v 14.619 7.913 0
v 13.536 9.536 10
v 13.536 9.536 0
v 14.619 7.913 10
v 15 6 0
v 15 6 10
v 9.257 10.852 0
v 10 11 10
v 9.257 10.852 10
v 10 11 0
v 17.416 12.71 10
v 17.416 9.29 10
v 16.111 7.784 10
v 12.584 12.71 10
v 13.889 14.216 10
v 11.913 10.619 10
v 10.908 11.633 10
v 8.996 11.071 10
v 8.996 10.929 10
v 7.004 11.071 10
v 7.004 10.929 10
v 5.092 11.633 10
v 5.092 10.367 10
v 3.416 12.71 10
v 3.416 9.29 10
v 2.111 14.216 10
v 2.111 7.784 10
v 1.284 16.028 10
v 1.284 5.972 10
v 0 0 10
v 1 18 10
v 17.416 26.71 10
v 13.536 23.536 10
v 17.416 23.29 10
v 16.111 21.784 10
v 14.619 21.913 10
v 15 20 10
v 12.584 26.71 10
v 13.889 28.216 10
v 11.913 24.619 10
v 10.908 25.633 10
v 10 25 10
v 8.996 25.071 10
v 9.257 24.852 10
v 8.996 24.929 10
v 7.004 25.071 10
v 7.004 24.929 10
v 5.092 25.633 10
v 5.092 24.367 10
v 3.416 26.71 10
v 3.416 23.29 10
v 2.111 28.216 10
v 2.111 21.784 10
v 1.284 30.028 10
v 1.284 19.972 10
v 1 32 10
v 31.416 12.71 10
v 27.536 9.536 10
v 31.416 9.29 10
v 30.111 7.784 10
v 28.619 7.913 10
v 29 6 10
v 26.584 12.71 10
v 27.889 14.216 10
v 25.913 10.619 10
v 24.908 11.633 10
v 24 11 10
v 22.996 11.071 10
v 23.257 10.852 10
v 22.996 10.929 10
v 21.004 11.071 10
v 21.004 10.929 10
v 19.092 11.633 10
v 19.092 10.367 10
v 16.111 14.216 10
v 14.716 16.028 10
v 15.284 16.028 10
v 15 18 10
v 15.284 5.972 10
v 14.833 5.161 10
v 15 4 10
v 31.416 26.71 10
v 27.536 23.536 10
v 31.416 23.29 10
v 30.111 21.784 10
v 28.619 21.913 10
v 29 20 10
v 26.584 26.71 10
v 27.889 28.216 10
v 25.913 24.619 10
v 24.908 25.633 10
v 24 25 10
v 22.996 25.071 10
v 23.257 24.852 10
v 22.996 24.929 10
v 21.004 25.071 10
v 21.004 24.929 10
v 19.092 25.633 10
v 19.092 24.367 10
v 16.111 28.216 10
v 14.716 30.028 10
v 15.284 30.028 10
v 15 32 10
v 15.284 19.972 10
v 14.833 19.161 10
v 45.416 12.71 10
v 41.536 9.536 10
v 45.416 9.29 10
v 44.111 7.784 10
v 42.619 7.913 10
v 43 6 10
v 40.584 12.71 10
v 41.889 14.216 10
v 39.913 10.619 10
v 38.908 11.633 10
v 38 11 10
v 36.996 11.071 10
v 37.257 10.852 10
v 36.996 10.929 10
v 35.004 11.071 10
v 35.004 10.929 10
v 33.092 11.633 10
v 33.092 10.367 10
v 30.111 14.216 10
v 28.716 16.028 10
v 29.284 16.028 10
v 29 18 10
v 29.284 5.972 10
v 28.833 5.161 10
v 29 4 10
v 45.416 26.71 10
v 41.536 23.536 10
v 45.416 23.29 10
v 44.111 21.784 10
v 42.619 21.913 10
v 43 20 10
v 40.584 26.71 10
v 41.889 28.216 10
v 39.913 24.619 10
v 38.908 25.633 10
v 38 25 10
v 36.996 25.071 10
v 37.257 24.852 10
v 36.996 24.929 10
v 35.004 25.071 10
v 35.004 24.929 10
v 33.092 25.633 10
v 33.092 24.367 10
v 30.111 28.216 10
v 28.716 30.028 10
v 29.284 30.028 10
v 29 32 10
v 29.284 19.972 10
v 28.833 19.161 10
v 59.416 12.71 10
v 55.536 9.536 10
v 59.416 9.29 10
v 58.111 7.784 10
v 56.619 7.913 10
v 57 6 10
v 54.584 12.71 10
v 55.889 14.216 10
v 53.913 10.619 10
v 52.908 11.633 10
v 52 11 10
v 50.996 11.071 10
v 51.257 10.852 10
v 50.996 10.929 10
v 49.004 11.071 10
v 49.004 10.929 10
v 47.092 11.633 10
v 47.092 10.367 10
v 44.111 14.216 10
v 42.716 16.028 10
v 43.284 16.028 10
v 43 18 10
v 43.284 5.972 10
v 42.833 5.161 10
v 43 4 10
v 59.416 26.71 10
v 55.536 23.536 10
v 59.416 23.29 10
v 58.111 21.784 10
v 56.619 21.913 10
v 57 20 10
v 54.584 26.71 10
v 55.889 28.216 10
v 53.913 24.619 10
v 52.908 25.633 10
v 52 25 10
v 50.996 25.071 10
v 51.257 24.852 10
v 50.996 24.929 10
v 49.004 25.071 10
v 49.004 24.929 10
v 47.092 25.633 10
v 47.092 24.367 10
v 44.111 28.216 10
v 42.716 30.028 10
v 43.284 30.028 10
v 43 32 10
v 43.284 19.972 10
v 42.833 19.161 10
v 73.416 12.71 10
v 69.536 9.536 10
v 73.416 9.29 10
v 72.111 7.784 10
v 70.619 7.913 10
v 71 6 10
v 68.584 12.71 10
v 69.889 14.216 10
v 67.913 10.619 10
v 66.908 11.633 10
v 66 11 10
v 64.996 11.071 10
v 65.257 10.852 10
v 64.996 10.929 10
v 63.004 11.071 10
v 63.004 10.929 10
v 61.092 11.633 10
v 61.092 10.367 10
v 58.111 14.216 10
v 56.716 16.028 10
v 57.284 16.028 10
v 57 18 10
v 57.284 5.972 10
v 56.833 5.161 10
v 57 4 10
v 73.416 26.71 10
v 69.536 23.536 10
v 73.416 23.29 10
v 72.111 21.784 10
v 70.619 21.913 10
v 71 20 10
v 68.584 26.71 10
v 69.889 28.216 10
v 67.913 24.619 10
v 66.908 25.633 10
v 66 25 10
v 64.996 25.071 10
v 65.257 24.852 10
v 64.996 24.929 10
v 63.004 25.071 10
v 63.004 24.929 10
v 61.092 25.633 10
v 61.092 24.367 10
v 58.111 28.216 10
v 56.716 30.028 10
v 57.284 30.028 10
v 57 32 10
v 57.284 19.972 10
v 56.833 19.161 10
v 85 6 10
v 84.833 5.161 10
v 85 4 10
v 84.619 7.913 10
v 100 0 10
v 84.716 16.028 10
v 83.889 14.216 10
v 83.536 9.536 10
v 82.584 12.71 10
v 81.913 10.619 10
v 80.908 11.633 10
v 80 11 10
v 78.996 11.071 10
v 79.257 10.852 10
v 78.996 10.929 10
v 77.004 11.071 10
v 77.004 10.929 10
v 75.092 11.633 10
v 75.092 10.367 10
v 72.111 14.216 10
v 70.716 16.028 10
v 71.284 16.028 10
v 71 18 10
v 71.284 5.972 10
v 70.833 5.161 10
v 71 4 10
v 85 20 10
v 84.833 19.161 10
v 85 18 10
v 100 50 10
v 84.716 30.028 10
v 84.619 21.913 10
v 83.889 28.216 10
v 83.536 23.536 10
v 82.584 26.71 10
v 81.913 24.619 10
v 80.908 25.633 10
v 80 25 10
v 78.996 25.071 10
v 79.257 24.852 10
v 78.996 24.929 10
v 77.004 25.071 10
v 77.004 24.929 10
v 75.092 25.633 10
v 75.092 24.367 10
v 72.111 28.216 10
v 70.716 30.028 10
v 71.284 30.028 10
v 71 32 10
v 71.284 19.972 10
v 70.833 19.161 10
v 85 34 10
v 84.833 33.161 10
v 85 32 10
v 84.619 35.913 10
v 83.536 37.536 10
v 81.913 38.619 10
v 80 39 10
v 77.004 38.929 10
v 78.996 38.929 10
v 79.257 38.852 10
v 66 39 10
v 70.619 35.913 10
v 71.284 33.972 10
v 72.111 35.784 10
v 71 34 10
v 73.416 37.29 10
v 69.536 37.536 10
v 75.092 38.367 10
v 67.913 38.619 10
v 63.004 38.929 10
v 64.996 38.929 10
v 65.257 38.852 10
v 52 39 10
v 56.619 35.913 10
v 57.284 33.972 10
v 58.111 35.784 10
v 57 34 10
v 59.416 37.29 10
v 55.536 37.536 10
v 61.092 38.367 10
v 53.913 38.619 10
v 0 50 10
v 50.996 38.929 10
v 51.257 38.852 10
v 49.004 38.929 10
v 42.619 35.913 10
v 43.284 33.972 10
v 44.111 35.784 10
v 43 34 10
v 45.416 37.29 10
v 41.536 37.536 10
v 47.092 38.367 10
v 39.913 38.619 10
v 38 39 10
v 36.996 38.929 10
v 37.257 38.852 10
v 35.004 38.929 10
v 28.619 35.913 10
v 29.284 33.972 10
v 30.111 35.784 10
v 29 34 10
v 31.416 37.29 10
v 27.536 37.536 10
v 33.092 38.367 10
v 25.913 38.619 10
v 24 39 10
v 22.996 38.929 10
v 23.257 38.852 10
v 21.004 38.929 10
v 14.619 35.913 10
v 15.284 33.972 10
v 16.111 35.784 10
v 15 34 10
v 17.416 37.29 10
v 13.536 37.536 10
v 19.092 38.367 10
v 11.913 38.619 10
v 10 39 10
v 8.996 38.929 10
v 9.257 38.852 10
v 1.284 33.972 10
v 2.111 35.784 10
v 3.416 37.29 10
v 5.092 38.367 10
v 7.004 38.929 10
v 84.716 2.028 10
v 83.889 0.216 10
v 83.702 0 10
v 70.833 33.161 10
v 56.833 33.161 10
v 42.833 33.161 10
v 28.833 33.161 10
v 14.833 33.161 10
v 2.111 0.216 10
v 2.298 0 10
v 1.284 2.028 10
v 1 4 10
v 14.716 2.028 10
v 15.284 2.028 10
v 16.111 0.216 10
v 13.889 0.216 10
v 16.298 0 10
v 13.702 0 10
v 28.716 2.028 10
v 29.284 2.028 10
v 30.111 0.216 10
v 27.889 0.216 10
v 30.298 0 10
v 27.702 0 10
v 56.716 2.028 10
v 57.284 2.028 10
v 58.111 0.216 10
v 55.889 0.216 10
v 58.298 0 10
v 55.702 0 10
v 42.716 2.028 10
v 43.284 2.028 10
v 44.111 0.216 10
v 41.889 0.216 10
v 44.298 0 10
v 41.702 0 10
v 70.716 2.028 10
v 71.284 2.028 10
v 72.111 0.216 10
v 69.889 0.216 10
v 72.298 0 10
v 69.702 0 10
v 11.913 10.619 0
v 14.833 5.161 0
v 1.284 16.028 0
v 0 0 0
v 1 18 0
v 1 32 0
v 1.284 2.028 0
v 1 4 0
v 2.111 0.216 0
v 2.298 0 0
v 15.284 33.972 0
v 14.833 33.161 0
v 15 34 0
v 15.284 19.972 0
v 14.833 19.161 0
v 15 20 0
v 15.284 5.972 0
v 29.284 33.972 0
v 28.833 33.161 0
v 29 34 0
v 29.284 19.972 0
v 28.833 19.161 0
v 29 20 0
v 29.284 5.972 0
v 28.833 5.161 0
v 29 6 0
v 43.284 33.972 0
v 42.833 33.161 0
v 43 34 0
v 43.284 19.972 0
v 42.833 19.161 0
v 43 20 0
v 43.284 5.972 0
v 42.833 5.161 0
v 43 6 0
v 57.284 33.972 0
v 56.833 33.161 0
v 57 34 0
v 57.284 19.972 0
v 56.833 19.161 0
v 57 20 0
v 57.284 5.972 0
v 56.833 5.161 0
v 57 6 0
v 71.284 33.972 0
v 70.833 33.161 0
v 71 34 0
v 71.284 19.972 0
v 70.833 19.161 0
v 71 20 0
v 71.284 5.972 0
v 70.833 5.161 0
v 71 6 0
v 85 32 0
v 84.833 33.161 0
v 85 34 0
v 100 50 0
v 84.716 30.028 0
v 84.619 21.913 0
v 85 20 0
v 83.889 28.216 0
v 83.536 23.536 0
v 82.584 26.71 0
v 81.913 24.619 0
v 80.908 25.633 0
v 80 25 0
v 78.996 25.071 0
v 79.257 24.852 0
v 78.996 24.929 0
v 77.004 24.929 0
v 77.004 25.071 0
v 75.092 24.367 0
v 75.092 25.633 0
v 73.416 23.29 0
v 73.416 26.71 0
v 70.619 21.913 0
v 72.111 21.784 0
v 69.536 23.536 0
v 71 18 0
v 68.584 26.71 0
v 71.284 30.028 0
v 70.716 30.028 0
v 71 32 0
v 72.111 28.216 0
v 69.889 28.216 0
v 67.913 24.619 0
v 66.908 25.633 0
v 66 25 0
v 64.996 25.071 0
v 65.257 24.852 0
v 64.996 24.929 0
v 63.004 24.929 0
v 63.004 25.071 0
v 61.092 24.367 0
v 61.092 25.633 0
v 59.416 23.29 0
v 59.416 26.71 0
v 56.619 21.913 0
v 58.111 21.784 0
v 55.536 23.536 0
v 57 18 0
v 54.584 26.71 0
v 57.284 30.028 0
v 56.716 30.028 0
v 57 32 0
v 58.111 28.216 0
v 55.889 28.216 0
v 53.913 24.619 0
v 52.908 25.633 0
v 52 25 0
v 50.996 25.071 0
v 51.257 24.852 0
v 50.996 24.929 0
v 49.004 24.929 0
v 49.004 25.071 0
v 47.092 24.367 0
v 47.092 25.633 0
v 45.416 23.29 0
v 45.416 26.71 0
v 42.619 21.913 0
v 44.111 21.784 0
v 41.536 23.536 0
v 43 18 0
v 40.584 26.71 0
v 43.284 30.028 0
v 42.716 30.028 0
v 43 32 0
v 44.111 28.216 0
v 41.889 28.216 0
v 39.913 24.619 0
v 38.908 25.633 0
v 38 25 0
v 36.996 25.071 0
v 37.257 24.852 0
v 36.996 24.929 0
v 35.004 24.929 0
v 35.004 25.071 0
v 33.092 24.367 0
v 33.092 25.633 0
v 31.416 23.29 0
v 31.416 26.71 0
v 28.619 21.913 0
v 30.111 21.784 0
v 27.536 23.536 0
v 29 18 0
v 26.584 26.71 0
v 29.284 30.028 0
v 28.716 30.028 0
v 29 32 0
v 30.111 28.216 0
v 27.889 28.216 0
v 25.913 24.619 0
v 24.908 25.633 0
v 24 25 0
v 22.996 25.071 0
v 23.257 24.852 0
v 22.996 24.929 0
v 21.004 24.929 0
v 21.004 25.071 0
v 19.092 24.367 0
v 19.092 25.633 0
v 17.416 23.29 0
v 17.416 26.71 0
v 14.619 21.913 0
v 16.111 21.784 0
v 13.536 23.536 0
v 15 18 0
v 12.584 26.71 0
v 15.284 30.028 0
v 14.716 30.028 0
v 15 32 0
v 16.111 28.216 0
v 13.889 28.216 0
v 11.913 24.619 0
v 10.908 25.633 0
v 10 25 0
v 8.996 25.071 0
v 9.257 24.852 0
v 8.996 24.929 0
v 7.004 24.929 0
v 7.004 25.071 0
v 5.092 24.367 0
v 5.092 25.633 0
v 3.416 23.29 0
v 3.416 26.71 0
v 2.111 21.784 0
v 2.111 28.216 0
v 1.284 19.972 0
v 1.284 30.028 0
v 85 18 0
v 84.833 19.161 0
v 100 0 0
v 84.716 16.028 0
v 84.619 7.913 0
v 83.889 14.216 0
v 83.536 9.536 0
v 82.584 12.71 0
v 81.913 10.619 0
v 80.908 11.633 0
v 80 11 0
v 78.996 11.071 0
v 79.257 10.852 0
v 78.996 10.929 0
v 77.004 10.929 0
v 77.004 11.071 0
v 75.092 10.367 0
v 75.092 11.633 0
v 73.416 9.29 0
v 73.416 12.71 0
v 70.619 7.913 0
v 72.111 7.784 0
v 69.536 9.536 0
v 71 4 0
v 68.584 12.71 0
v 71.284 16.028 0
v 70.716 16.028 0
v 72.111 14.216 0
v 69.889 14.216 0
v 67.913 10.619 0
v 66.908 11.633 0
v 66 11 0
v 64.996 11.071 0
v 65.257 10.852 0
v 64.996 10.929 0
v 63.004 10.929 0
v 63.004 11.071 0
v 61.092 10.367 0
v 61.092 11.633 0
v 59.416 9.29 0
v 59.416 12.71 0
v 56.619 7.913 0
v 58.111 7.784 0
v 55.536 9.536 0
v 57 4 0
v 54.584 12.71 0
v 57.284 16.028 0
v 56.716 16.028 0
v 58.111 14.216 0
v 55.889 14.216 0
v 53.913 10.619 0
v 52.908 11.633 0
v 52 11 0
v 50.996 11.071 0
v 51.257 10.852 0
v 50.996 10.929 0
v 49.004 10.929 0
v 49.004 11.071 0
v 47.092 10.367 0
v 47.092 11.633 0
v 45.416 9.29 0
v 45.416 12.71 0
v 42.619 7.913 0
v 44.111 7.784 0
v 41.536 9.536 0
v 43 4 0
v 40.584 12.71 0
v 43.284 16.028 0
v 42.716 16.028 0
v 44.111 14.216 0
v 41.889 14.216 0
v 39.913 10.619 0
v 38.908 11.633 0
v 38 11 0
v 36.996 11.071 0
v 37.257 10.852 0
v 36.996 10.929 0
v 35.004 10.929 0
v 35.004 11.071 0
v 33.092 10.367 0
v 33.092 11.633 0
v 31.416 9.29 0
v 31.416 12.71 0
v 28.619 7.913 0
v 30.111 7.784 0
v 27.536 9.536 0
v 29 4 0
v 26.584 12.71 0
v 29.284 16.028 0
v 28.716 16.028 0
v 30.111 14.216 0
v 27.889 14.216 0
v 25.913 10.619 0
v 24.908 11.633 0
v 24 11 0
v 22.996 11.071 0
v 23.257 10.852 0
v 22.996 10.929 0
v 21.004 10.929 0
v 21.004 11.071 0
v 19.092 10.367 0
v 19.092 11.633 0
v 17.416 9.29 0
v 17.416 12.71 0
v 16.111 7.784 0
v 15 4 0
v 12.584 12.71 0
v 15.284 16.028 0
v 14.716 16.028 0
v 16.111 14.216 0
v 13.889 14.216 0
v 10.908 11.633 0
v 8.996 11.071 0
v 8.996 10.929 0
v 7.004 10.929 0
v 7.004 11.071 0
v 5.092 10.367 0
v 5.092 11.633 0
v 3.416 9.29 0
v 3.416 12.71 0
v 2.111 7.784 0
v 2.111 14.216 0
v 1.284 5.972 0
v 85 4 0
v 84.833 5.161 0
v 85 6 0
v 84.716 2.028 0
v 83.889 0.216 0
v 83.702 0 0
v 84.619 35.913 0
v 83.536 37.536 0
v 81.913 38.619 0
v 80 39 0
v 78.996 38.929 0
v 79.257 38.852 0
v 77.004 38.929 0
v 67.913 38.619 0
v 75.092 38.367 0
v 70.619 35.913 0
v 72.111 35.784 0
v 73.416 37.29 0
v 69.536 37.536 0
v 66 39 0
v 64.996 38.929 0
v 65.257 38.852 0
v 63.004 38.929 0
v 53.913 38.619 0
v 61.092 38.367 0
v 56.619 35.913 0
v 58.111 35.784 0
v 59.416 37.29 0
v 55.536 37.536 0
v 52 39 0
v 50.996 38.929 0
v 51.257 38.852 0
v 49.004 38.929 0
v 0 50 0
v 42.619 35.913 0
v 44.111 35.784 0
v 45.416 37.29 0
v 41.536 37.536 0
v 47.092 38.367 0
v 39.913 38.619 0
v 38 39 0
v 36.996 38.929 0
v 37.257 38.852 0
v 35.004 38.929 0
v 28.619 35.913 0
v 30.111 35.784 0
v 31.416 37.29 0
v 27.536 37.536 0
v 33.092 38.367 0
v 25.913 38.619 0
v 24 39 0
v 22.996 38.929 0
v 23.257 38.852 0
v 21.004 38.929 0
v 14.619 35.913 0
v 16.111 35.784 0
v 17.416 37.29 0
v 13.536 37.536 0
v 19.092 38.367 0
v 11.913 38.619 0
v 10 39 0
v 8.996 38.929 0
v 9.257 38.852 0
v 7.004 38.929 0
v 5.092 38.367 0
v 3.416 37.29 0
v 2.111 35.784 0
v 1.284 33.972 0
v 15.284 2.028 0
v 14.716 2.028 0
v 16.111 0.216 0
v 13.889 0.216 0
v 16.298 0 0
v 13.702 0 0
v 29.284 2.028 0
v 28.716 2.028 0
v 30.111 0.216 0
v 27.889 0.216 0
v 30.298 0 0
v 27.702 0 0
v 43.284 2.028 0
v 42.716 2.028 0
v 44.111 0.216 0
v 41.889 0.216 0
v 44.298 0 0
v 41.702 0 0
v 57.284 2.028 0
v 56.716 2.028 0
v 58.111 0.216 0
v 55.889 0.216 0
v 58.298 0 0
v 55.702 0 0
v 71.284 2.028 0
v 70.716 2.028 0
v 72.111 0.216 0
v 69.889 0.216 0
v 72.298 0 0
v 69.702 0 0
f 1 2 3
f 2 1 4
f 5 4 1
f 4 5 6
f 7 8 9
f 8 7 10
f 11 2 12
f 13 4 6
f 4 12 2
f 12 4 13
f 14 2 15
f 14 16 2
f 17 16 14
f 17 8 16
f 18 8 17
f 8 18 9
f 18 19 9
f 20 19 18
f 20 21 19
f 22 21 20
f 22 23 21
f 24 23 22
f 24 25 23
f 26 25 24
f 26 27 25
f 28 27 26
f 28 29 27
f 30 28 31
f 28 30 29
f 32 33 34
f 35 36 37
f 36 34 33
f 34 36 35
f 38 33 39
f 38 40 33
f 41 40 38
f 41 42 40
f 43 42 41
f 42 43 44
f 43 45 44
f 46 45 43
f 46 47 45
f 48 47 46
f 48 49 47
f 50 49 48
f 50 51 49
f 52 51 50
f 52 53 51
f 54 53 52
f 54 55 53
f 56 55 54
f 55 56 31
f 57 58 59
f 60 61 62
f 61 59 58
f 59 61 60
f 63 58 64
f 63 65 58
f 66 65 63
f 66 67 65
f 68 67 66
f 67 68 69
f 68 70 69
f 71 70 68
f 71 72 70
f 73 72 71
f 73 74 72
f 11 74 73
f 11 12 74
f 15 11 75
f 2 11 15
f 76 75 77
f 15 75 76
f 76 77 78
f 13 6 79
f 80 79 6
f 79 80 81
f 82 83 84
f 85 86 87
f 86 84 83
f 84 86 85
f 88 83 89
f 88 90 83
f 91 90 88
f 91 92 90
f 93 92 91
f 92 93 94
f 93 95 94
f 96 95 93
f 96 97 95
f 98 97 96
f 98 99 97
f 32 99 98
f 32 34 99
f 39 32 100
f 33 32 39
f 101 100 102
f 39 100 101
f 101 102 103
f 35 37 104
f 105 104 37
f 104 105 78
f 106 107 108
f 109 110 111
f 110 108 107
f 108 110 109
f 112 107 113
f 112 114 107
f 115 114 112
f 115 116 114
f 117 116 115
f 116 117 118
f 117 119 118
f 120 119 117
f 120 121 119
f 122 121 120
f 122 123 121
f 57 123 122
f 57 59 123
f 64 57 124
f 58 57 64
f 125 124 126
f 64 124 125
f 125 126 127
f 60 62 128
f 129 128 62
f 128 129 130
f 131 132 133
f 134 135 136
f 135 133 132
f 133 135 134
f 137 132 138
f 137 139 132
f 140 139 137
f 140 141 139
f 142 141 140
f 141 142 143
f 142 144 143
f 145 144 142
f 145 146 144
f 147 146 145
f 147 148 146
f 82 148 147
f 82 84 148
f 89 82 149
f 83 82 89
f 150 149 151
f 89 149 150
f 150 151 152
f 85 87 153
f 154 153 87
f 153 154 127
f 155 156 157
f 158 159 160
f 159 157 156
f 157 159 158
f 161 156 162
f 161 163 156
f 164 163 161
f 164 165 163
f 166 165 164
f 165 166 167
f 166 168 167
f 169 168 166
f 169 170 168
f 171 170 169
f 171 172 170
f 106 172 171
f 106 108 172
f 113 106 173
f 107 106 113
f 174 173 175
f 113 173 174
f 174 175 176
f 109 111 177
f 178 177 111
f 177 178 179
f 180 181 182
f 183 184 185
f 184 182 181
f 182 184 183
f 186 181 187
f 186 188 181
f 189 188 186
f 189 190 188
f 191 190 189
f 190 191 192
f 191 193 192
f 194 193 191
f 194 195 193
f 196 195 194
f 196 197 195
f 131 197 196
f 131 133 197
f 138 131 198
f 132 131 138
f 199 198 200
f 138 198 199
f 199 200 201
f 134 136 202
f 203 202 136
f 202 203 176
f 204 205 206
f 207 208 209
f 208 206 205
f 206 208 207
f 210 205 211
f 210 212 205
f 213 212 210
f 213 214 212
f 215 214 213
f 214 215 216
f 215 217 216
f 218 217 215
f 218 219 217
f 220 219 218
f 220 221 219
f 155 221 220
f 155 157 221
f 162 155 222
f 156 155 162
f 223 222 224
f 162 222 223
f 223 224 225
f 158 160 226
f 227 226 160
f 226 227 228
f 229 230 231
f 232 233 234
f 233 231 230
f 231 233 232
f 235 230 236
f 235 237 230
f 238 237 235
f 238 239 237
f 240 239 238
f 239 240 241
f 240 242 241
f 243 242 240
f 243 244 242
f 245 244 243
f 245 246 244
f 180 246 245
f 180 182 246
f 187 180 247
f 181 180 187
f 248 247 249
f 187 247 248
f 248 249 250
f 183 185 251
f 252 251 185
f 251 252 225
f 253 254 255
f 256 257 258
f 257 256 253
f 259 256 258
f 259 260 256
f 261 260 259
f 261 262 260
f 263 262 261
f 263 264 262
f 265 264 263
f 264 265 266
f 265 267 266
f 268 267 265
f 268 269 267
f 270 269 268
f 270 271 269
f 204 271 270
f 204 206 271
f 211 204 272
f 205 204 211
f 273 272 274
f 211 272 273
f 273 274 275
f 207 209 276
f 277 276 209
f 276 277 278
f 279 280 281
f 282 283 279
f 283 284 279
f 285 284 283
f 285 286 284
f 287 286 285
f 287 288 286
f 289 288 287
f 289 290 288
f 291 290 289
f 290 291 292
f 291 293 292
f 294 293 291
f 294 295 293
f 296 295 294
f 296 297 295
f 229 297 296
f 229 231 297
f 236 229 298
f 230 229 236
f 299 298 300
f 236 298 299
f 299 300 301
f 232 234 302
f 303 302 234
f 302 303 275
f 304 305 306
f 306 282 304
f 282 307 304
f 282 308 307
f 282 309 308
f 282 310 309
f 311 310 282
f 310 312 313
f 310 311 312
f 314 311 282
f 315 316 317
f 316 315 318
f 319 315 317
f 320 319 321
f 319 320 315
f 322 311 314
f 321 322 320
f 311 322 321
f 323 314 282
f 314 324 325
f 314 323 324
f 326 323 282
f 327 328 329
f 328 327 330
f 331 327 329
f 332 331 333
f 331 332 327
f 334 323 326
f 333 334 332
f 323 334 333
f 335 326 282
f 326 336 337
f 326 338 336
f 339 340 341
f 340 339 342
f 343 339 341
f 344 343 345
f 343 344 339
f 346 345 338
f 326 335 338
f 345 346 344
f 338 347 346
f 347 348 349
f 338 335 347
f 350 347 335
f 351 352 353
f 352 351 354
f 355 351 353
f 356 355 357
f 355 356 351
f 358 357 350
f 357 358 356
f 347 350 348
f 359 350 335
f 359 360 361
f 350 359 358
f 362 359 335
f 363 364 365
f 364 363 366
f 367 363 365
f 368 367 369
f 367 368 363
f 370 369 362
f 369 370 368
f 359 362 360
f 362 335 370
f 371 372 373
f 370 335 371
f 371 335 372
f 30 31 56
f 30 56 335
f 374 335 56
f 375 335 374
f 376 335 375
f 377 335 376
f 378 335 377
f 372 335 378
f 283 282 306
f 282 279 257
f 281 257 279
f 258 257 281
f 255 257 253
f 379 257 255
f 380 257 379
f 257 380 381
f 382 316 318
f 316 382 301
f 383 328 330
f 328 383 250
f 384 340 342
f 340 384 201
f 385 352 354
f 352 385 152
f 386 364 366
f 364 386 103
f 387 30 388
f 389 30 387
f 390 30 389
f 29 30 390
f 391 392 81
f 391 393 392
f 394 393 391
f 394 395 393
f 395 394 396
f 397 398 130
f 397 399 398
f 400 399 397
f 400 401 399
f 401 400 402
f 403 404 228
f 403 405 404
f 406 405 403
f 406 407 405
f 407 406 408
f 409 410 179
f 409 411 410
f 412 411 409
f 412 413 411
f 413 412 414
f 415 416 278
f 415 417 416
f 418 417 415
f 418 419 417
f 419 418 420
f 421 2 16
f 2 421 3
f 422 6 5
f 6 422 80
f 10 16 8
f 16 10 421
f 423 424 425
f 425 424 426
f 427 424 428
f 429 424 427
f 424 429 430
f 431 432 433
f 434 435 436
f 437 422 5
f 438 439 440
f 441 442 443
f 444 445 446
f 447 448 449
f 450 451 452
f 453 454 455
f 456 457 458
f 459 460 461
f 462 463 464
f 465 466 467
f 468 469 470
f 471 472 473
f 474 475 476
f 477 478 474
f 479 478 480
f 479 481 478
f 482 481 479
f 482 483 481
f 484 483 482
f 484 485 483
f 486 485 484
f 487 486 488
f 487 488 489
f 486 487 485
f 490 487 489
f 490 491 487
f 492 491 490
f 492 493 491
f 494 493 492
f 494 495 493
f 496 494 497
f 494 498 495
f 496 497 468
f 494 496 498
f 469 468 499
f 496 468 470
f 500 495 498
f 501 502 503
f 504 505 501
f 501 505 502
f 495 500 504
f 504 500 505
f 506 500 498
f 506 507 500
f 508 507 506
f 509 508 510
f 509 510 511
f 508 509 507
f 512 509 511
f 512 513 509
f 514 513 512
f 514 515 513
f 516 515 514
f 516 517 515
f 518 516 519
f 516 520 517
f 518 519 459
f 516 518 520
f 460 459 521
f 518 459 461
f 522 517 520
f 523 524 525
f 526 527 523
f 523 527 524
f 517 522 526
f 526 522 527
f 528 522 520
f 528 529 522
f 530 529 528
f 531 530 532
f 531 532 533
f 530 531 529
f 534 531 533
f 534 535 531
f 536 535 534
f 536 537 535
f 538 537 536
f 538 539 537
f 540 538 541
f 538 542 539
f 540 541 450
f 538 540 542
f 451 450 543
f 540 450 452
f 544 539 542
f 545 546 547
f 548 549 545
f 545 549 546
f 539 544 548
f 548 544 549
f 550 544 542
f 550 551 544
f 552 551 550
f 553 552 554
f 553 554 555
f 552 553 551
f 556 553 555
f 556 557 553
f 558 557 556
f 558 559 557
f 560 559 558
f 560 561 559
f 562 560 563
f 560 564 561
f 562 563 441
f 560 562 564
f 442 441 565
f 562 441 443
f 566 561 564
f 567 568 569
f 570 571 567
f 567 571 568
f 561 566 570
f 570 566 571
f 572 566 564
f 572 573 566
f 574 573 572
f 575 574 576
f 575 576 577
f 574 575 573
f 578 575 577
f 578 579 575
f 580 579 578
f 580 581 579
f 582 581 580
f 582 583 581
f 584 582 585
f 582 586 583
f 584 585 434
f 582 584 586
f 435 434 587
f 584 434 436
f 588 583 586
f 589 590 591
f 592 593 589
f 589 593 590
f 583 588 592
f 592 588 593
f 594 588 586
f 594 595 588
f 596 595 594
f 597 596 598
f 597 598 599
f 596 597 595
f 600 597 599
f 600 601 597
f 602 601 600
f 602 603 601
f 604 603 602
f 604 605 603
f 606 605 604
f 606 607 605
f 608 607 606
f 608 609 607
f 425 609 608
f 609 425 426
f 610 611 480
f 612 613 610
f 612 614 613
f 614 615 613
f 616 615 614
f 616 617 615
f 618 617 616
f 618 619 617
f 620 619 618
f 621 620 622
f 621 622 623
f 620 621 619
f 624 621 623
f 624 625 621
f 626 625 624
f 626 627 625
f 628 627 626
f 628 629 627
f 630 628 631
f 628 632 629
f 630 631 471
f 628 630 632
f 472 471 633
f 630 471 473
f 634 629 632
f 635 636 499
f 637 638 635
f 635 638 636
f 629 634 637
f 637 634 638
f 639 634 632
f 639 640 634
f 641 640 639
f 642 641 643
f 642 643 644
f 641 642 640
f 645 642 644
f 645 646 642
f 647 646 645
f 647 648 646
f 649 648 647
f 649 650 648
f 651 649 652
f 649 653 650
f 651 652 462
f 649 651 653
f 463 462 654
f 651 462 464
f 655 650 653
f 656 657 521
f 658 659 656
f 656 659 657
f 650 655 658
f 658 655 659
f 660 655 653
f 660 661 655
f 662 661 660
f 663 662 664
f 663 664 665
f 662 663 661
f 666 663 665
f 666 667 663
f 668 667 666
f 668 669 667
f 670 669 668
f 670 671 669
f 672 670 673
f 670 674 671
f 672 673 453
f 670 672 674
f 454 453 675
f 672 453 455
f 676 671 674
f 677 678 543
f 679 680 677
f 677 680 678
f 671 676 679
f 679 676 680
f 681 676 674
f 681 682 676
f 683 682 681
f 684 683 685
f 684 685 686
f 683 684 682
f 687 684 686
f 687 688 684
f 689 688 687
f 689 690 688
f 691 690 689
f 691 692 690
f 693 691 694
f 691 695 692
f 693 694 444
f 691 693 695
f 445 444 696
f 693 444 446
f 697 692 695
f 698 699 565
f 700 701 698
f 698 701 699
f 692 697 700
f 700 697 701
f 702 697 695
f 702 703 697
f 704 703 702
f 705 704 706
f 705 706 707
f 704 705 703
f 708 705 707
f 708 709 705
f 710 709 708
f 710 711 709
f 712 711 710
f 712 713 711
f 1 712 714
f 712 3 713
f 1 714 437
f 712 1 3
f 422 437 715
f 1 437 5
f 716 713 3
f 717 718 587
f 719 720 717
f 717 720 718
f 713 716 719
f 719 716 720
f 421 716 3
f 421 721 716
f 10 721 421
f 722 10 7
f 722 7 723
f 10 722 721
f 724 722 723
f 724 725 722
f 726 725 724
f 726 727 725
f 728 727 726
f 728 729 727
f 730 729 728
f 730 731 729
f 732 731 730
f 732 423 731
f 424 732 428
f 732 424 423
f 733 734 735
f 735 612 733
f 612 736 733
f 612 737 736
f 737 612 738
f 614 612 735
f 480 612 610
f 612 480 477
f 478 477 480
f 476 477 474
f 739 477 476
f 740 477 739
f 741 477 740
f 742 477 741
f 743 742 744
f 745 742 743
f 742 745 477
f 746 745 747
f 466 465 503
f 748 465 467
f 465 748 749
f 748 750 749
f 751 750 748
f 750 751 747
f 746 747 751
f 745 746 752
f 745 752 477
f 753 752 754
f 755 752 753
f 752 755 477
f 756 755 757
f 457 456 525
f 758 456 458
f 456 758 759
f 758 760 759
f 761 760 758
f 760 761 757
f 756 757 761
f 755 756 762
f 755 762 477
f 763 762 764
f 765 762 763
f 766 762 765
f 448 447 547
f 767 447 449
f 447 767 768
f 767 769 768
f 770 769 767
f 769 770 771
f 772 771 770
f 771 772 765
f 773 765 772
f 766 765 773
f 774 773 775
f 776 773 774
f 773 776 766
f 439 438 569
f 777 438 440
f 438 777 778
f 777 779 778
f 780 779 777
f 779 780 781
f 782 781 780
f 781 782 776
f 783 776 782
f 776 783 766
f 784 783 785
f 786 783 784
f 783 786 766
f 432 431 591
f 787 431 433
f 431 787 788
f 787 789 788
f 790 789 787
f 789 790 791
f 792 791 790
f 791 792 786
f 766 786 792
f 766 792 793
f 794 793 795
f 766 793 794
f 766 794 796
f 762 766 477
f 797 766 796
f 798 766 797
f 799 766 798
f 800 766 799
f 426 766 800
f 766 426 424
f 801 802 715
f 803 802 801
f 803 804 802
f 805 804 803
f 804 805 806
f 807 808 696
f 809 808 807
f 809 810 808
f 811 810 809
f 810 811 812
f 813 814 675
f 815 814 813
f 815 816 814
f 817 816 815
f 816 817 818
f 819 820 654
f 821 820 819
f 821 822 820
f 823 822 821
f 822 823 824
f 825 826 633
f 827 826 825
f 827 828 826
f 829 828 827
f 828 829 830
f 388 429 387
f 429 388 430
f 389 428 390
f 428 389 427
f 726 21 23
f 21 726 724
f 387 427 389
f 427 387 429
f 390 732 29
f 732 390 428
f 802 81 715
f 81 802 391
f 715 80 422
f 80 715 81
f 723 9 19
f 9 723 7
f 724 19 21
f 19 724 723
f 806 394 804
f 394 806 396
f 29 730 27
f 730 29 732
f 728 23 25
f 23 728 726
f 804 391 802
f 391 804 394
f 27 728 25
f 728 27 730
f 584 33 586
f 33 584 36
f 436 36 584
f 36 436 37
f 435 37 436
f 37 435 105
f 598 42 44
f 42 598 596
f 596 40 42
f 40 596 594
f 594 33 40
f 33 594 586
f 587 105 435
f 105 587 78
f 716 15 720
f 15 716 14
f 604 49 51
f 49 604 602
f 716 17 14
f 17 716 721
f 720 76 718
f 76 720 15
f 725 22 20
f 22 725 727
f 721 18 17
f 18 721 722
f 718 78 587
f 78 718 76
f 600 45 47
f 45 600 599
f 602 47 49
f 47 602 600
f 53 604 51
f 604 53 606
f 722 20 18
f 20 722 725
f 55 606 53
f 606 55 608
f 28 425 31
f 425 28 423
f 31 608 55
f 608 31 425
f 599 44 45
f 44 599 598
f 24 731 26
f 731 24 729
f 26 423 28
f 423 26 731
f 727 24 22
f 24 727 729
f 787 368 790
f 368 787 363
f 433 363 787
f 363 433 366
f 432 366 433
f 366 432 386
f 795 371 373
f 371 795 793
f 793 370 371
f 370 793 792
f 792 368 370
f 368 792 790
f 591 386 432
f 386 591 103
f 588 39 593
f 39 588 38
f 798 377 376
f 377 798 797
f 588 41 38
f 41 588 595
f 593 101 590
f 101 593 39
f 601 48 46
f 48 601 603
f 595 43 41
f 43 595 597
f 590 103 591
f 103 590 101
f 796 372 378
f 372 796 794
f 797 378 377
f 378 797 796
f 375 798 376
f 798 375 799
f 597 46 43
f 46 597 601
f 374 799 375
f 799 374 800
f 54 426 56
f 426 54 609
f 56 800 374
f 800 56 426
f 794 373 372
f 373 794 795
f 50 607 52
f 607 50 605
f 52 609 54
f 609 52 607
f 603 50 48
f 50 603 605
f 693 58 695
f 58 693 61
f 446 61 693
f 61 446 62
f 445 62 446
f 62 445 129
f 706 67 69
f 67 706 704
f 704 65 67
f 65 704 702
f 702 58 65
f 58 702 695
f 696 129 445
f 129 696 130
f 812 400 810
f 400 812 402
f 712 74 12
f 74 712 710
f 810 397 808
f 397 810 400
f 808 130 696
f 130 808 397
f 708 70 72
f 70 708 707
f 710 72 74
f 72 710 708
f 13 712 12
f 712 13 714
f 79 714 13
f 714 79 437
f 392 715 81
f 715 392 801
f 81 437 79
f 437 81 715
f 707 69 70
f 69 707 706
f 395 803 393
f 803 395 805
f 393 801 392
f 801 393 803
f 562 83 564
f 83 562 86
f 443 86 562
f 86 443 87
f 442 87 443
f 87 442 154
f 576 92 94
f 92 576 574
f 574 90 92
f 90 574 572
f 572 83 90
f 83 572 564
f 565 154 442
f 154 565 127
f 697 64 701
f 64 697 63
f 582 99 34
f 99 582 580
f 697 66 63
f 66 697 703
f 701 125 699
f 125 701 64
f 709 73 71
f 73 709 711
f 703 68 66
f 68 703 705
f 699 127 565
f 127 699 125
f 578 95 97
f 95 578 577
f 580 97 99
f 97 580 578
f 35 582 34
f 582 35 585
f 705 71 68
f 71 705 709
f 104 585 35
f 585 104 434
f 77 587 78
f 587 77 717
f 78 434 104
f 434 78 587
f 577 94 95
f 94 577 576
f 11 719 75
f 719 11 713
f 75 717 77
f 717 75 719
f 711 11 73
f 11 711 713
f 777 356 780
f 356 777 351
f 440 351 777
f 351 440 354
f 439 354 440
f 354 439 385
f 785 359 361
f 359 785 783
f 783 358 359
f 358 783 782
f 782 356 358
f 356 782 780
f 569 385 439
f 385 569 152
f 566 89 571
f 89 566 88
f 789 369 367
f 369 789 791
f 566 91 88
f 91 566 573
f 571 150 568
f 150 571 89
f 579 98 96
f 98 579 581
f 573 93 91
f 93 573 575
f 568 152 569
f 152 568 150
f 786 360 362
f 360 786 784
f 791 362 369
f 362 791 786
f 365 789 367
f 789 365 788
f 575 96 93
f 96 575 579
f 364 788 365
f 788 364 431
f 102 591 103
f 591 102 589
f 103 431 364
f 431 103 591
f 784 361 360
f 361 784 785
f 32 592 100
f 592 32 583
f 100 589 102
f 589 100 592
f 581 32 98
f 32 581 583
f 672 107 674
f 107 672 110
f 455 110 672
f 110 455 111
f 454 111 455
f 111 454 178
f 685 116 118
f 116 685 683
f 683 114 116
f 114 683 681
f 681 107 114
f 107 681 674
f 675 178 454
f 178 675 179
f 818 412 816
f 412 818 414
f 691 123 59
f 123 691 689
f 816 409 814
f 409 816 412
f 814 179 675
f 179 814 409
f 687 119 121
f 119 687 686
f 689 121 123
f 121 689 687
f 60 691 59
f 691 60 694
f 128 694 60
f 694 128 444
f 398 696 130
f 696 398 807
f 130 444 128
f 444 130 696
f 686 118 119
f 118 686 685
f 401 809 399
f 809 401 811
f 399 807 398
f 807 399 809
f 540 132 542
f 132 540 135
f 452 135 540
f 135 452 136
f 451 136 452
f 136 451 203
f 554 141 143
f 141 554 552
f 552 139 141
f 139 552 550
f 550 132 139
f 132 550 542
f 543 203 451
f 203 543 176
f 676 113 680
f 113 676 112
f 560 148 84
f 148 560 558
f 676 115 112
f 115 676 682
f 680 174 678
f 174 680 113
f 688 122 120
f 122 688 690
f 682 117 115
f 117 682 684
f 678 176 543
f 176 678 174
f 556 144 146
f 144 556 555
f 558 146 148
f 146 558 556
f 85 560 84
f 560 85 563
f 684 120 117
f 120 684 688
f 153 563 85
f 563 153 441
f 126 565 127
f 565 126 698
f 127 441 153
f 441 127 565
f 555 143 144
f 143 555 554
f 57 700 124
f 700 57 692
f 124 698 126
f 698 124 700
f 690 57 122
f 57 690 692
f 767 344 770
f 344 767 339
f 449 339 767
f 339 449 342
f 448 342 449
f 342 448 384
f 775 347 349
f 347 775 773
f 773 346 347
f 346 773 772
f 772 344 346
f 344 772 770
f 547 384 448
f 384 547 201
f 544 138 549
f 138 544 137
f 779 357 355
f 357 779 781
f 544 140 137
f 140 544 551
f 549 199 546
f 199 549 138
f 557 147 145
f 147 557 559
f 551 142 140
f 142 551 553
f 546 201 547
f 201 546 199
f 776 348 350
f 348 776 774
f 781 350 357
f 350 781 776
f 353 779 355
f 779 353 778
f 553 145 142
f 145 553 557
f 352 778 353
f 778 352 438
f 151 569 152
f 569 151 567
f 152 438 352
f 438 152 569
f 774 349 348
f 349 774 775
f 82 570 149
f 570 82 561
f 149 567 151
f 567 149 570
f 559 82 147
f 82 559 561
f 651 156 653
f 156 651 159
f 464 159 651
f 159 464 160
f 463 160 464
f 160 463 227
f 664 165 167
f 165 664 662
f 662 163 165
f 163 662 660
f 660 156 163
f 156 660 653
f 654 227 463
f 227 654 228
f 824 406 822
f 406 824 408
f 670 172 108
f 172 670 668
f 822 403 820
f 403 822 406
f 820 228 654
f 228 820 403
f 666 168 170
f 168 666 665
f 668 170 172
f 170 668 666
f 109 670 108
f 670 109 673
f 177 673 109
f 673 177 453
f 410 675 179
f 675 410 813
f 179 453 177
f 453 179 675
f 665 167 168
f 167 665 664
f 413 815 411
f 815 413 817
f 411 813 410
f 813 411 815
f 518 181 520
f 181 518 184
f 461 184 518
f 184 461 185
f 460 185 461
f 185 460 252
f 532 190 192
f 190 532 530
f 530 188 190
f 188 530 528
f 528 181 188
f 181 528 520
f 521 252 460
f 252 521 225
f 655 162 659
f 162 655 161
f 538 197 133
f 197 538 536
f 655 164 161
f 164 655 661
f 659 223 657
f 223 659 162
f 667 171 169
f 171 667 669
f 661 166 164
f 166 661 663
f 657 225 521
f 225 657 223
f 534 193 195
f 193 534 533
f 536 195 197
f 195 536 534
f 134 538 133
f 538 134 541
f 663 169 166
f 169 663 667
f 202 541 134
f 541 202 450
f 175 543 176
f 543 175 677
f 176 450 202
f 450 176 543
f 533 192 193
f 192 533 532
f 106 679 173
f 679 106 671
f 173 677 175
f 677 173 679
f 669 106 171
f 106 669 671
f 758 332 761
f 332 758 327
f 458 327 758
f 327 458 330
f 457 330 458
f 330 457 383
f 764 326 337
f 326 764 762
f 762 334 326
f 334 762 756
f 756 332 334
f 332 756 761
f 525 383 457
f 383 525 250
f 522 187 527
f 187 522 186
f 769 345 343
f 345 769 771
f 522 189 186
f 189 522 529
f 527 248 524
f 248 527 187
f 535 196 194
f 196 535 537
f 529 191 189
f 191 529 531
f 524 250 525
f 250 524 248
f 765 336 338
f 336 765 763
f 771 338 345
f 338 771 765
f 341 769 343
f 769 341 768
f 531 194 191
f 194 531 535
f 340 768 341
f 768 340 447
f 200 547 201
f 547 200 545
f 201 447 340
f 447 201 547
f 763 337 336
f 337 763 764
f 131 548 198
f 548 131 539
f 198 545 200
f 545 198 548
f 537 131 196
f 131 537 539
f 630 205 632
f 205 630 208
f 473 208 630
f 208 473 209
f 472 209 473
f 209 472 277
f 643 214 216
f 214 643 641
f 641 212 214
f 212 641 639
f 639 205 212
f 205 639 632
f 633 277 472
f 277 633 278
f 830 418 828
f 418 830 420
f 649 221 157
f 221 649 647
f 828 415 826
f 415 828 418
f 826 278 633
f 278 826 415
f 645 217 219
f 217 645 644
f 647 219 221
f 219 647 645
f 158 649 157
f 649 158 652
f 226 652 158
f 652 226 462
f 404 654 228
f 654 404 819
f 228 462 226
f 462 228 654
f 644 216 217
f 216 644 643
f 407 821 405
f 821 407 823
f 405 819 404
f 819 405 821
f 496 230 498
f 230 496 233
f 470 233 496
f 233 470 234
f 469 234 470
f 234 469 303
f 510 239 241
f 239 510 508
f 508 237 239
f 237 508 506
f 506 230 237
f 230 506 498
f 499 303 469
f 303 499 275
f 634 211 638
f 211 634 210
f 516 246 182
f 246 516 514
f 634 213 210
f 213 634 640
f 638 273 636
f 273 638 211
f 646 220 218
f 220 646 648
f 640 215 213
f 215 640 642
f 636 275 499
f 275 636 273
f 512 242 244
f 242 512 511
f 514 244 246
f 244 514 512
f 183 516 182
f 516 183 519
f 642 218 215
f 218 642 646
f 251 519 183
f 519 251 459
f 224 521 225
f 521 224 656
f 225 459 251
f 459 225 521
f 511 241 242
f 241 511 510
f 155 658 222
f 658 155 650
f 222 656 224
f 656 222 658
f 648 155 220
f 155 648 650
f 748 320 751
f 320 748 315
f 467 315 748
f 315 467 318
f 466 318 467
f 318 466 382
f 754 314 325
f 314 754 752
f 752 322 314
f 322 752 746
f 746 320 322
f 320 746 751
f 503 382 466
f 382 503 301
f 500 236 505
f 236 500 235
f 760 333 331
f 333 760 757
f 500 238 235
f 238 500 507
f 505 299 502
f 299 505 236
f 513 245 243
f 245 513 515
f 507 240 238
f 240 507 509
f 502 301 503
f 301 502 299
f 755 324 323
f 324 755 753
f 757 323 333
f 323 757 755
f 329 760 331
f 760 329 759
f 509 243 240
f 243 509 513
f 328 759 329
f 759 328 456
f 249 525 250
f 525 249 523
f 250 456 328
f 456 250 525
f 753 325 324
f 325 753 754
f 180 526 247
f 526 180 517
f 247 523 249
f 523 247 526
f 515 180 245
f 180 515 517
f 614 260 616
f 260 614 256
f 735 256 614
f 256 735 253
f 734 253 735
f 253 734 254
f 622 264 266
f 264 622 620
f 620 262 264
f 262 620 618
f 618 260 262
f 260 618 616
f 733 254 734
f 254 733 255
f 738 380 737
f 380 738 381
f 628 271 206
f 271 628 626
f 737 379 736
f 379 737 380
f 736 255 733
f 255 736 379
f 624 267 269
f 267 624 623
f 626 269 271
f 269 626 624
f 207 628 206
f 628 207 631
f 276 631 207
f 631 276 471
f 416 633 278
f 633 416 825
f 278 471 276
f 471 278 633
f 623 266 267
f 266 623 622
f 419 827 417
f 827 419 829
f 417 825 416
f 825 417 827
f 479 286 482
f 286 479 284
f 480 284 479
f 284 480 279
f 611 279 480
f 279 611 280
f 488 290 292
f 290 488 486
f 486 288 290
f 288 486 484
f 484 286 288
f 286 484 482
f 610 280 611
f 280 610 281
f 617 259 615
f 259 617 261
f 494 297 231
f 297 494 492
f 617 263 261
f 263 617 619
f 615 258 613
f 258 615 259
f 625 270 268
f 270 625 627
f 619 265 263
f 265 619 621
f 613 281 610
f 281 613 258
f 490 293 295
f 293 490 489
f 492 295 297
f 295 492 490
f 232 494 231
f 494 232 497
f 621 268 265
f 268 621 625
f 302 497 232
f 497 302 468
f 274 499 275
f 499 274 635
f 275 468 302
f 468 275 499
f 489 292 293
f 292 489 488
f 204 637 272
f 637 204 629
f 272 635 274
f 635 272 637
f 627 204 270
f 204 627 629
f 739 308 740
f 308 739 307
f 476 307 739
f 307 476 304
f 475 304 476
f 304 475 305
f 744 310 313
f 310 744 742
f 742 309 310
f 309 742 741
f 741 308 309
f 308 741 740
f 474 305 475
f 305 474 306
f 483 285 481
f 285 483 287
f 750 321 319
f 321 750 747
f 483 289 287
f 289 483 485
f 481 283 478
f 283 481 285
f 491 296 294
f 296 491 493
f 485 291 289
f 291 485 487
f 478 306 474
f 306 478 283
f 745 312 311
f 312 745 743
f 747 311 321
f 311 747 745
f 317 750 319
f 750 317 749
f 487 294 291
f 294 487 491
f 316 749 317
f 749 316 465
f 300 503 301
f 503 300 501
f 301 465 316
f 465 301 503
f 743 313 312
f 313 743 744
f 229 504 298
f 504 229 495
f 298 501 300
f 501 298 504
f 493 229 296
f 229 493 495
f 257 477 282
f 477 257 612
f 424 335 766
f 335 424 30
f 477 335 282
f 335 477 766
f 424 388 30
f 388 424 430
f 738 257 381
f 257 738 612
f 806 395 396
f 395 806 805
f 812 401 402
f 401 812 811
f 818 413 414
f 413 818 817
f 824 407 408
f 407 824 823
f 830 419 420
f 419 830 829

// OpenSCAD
module distribute_cylinders_with_rim(cube_size=[100, 50, 10], cylinder_diameter=10, cylinder_height=10, spacing=4, rim_width=2, rim_height=1) {
    // Berechnung der Anzahl der Zylinder in X- und Y-Richtung
    cols = floor((cube_size[0] - spacing) / (cylinder_diameter + spacing));
    rows = floor((cube_size[1] - spacing) / (cylinder_diameter + spacing));
    
    // Berechnung des Abstands vom Rand
    x_margin = (cube_size[0] - (cols * (cylinder_diameter + spacing) - spacing)) / 2;
    y_margin = (cube_size[1] - (rows * (cylinder_diameter + spacing) - spacing)) / 2;
    
    // Erstellen des Cubes
    difference() {
        cube([cube_size[0], cube_size[1], cube_size[2]]);
        
        // Platzieren der Zylinder und Ränder
        for (x = [0:cols-1]) {
            for (y = [0:rows-1]) {
                translate([x_margin + x * (cylinder_diameter + spacing), y_margin + y * (cylinder_diameter + spacing), 0]) {
                    // Zylinderloch
                    cylinder(h=cube_size[2], d=cylinder_diameter);
                    
                    // Rand um das Loch
                    translate([-rim_width, -rim_width, -rim_height])
                        cylinder(h=cube_size[2] + rim_height, d=cylinder_diameter + 2 * rim_width);
                }
            }
        }
    }
}

// Beispielaufruf der Funktion
distribute_cylinders_with_rim([100, 50, 10], 10, 10, 4, 2, 1);
